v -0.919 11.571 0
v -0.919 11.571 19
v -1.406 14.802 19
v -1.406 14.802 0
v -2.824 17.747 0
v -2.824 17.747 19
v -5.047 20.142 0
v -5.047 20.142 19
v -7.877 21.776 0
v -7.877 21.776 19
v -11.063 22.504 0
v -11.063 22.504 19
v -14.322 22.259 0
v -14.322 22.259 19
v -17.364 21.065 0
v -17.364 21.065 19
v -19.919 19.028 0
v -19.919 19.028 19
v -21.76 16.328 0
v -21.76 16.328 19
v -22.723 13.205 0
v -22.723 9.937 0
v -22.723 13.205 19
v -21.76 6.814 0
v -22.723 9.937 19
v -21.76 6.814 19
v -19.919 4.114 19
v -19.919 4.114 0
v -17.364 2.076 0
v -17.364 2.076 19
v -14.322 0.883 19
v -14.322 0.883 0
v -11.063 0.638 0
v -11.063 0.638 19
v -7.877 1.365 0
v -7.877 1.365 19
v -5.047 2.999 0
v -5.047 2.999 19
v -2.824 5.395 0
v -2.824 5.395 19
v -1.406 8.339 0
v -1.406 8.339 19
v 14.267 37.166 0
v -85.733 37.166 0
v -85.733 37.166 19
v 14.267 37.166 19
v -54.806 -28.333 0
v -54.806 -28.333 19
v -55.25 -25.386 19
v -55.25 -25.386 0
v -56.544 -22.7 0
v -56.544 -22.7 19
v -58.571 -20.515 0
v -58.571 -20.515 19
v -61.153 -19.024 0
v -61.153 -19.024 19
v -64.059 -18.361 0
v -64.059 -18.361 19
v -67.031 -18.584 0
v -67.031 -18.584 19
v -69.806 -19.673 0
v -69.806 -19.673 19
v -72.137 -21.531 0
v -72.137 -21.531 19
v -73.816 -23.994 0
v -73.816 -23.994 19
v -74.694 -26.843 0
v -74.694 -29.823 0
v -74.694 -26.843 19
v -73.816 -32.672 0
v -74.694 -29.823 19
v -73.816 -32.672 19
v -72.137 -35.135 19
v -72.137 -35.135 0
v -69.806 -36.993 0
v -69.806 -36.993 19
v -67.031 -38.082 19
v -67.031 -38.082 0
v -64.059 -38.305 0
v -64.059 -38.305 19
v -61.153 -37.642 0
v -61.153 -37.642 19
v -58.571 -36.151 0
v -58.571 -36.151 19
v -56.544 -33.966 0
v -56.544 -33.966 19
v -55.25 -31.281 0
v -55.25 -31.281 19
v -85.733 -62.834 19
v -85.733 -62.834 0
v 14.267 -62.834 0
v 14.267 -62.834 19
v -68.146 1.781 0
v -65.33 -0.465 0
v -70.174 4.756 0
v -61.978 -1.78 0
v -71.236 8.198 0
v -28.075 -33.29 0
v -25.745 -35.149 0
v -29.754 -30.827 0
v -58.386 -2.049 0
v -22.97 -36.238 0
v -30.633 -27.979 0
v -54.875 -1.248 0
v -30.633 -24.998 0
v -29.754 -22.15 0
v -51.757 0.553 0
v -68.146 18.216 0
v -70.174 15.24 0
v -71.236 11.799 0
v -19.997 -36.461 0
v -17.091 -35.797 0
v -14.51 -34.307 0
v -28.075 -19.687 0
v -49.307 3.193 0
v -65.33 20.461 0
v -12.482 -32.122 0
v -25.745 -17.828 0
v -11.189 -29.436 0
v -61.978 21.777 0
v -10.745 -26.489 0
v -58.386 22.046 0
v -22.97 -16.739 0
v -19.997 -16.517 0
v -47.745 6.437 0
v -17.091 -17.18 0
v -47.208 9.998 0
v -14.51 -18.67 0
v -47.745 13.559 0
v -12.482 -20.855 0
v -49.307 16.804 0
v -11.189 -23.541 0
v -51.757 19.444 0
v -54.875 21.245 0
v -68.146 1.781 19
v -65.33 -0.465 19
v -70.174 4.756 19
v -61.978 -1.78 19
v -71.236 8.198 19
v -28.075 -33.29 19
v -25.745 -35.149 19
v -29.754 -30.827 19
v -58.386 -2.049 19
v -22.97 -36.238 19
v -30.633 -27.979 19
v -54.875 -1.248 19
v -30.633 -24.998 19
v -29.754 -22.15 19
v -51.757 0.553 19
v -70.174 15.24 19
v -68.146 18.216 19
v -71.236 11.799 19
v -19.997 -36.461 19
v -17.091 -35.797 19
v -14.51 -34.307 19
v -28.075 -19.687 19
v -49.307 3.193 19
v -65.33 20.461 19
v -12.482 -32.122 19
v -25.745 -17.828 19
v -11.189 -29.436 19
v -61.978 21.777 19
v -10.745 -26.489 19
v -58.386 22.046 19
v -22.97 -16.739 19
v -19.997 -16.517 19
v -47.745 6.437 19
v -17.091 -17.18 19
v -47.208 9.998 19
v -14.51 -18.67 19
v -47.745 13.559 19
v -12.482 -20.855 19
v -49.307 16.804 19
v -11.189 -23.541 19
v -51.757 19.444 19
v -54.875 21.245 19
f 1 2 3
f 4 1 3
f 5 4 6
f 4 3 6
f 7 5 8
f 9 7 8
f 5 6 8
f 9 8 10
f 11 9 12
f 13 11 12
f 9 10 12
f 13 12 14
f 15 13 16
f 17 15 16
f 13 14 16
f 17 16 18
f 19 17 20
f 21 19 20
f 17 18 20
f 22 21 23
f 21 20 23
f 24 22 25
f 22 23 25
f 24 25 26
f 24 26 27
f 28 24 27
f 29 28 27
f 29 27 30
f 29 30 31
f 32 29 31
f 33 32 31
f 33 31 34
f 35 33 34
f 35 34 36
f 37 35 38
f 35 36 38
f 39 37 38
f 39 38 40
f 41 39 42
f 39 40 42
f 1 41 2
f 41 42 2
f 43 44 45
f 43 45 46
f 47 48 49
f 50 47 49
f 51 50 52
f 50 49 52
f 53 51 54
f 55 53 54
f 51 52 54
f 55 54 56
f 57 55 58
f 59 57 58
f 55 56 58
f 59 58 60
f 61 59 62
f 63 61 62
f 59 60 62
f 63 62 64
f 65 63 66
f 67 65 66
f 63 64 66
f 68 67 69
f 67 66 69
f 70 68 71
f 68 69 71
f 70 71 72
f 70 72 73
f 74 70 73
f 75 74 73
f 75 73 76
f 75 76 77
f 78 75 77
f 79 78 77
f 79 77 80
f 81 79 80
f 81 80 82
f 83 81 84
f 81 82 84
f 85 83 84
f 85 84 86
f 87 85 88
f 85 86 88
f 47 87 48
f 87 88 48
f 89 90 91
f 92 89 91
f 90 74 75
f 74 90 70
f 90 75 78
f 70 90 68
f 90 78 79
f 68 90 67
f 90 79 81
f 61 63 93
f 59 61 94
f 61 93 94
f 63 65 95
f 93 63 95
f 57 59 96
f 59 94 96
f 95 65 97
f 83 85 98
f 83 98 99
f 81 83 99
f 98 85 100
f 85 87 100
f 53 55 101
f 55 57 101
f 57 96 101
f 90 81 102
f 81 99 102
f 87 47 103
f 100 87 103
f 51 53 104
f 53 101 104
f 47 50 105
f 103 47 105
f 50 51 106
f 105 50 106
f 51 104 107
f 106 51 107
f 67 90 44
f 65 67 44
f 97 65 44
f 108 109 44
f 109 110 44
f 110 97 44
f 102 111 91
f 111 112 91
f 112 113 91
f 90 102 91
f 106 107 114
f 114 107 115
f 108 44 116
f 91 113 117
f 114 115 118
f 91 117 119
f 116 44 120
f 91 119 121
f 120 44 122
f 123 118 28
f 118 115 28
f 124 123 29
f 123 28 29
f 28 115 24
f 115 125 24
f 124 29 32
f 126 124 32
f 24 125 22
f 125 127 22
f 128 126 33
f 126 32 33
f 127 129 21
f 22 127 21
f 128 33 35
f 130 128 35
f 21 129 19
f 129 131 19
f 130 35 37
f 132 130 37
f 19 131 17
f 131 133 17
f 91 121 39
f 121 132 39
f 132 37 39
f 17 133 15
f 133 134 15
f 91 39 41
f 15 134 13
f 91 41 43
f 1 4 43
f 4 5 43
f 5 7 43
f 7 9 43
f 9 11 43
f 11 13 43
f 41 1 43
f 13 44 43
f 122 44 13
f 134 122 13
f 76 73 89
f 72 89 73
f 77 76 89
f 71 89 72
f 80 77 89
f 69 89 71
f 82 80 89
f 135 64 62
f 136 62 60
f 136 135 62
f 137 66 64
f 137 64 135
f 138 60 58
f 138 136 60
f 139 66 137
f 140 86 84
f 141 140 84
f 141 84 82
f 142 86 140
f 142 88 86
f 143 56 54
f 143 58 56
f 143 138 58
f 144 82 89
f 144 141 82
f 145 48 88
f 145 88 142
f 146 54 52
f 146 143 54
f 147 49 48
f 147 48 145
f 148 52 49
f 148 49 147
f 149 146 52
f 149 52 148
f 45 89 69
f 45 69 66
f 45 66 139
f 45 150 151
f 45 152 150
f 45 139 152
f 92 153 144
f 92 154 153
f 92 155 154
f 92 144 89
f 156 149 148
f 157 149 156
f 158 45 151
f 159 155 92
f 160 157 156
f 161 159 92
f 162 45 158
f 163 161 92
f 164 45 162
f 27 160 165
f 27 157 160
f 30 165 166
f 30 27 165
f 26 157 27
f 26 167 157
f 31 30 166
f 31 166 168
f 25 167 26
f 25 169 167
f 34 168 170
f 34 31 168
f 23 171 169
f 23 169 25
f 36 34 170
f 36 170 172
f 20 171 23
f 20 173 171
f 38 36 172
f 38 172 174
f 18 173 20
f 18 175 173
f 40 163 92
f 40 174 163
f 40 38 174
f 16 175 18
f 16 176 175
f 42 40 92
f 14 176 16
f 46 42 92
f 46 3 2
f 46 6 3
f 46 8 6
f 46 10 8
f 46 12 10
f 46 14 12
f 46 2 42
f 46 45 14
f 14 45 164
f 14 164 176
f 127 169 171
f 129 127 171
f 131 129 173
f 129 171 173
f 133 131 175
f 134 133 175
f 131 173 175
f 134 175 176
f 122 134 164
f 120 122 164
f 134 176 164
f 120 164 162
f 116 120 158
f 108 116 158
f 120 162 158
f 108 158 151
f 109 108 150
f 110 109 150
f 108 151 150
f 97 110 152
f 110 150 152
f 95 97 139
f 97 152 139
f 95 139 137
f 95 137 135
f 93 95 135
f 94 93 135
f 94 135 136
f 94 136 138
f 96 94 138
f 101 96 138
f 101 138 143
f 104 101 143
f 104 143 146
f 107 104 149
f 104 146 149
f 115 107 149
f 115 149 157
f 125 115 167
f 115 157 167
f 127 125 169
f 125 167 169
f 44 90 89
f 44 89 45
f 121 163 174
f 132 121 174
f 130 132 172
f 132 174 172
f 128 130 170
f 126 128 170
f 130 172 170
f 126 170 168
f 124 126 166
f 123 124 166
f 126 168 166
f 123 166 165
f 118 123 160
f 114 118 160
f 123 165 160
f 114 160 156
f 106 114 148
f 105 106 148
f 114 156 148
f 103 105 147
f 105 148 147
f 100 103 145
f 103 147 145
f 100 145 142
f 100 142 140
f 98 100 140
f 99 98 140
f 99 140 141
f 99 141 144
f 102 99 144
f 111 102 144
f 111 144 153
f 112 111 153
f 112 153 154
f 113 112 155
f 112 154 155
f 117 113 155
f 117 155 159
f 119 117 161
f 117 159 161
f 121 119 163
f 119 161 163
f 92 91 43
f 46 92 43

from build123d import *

# Parameters (mm, degrees)
F0_W     = 100
F0_H     = 100
F1_DEPTH = 19
F2_R     = 12.081431
F3_DEPTH = 19
F4_R     = 10.963325
F5_DEPTH = 19
F6_R     = 10
F7_DEPTH = 19


with BuildPart() as f1:
    # F0 (on Top) → F1 (new body)
    with BuildSketch(Plane.XY):
        with Locations((-35.732688, -12.833619)):
            Rectangle(F0_W, F0_H)
    extrude(amount=F1_DEPTH)

    # F2 (on face) → F3 (cut)
    with BuildSketch(Plane.XY.offset(19)):
        with Locations((-59.289314, 9.998217)):
            Circle(F2_R)
    extrude(amount=-F3_DEPTH, mode=Mode.SUBTRACT)

    # F4 (on face) → F5 (cut)
    with BuildSketch(Plane.XY.offset(19)):
        with Locations((-11.882036, 11.570971)):
            Circle(F4_R)
    extrude(amount=-F5_DEPTH, mode=Mode.SUBTRACT)

    # F6 (on face) → F7 (cut)
    with BuildSketch(Plane.XY.offset(19)):
        with Locations((-64.806127, -28.333058)):
            Circle(F6_R)
        with Locations((-20.744683, -26.488627)):
            Circle(F6_R)
    extrude(amount=-F7_DEPTH, mode=Mode.SUBTRACT)


solid = f1.part
